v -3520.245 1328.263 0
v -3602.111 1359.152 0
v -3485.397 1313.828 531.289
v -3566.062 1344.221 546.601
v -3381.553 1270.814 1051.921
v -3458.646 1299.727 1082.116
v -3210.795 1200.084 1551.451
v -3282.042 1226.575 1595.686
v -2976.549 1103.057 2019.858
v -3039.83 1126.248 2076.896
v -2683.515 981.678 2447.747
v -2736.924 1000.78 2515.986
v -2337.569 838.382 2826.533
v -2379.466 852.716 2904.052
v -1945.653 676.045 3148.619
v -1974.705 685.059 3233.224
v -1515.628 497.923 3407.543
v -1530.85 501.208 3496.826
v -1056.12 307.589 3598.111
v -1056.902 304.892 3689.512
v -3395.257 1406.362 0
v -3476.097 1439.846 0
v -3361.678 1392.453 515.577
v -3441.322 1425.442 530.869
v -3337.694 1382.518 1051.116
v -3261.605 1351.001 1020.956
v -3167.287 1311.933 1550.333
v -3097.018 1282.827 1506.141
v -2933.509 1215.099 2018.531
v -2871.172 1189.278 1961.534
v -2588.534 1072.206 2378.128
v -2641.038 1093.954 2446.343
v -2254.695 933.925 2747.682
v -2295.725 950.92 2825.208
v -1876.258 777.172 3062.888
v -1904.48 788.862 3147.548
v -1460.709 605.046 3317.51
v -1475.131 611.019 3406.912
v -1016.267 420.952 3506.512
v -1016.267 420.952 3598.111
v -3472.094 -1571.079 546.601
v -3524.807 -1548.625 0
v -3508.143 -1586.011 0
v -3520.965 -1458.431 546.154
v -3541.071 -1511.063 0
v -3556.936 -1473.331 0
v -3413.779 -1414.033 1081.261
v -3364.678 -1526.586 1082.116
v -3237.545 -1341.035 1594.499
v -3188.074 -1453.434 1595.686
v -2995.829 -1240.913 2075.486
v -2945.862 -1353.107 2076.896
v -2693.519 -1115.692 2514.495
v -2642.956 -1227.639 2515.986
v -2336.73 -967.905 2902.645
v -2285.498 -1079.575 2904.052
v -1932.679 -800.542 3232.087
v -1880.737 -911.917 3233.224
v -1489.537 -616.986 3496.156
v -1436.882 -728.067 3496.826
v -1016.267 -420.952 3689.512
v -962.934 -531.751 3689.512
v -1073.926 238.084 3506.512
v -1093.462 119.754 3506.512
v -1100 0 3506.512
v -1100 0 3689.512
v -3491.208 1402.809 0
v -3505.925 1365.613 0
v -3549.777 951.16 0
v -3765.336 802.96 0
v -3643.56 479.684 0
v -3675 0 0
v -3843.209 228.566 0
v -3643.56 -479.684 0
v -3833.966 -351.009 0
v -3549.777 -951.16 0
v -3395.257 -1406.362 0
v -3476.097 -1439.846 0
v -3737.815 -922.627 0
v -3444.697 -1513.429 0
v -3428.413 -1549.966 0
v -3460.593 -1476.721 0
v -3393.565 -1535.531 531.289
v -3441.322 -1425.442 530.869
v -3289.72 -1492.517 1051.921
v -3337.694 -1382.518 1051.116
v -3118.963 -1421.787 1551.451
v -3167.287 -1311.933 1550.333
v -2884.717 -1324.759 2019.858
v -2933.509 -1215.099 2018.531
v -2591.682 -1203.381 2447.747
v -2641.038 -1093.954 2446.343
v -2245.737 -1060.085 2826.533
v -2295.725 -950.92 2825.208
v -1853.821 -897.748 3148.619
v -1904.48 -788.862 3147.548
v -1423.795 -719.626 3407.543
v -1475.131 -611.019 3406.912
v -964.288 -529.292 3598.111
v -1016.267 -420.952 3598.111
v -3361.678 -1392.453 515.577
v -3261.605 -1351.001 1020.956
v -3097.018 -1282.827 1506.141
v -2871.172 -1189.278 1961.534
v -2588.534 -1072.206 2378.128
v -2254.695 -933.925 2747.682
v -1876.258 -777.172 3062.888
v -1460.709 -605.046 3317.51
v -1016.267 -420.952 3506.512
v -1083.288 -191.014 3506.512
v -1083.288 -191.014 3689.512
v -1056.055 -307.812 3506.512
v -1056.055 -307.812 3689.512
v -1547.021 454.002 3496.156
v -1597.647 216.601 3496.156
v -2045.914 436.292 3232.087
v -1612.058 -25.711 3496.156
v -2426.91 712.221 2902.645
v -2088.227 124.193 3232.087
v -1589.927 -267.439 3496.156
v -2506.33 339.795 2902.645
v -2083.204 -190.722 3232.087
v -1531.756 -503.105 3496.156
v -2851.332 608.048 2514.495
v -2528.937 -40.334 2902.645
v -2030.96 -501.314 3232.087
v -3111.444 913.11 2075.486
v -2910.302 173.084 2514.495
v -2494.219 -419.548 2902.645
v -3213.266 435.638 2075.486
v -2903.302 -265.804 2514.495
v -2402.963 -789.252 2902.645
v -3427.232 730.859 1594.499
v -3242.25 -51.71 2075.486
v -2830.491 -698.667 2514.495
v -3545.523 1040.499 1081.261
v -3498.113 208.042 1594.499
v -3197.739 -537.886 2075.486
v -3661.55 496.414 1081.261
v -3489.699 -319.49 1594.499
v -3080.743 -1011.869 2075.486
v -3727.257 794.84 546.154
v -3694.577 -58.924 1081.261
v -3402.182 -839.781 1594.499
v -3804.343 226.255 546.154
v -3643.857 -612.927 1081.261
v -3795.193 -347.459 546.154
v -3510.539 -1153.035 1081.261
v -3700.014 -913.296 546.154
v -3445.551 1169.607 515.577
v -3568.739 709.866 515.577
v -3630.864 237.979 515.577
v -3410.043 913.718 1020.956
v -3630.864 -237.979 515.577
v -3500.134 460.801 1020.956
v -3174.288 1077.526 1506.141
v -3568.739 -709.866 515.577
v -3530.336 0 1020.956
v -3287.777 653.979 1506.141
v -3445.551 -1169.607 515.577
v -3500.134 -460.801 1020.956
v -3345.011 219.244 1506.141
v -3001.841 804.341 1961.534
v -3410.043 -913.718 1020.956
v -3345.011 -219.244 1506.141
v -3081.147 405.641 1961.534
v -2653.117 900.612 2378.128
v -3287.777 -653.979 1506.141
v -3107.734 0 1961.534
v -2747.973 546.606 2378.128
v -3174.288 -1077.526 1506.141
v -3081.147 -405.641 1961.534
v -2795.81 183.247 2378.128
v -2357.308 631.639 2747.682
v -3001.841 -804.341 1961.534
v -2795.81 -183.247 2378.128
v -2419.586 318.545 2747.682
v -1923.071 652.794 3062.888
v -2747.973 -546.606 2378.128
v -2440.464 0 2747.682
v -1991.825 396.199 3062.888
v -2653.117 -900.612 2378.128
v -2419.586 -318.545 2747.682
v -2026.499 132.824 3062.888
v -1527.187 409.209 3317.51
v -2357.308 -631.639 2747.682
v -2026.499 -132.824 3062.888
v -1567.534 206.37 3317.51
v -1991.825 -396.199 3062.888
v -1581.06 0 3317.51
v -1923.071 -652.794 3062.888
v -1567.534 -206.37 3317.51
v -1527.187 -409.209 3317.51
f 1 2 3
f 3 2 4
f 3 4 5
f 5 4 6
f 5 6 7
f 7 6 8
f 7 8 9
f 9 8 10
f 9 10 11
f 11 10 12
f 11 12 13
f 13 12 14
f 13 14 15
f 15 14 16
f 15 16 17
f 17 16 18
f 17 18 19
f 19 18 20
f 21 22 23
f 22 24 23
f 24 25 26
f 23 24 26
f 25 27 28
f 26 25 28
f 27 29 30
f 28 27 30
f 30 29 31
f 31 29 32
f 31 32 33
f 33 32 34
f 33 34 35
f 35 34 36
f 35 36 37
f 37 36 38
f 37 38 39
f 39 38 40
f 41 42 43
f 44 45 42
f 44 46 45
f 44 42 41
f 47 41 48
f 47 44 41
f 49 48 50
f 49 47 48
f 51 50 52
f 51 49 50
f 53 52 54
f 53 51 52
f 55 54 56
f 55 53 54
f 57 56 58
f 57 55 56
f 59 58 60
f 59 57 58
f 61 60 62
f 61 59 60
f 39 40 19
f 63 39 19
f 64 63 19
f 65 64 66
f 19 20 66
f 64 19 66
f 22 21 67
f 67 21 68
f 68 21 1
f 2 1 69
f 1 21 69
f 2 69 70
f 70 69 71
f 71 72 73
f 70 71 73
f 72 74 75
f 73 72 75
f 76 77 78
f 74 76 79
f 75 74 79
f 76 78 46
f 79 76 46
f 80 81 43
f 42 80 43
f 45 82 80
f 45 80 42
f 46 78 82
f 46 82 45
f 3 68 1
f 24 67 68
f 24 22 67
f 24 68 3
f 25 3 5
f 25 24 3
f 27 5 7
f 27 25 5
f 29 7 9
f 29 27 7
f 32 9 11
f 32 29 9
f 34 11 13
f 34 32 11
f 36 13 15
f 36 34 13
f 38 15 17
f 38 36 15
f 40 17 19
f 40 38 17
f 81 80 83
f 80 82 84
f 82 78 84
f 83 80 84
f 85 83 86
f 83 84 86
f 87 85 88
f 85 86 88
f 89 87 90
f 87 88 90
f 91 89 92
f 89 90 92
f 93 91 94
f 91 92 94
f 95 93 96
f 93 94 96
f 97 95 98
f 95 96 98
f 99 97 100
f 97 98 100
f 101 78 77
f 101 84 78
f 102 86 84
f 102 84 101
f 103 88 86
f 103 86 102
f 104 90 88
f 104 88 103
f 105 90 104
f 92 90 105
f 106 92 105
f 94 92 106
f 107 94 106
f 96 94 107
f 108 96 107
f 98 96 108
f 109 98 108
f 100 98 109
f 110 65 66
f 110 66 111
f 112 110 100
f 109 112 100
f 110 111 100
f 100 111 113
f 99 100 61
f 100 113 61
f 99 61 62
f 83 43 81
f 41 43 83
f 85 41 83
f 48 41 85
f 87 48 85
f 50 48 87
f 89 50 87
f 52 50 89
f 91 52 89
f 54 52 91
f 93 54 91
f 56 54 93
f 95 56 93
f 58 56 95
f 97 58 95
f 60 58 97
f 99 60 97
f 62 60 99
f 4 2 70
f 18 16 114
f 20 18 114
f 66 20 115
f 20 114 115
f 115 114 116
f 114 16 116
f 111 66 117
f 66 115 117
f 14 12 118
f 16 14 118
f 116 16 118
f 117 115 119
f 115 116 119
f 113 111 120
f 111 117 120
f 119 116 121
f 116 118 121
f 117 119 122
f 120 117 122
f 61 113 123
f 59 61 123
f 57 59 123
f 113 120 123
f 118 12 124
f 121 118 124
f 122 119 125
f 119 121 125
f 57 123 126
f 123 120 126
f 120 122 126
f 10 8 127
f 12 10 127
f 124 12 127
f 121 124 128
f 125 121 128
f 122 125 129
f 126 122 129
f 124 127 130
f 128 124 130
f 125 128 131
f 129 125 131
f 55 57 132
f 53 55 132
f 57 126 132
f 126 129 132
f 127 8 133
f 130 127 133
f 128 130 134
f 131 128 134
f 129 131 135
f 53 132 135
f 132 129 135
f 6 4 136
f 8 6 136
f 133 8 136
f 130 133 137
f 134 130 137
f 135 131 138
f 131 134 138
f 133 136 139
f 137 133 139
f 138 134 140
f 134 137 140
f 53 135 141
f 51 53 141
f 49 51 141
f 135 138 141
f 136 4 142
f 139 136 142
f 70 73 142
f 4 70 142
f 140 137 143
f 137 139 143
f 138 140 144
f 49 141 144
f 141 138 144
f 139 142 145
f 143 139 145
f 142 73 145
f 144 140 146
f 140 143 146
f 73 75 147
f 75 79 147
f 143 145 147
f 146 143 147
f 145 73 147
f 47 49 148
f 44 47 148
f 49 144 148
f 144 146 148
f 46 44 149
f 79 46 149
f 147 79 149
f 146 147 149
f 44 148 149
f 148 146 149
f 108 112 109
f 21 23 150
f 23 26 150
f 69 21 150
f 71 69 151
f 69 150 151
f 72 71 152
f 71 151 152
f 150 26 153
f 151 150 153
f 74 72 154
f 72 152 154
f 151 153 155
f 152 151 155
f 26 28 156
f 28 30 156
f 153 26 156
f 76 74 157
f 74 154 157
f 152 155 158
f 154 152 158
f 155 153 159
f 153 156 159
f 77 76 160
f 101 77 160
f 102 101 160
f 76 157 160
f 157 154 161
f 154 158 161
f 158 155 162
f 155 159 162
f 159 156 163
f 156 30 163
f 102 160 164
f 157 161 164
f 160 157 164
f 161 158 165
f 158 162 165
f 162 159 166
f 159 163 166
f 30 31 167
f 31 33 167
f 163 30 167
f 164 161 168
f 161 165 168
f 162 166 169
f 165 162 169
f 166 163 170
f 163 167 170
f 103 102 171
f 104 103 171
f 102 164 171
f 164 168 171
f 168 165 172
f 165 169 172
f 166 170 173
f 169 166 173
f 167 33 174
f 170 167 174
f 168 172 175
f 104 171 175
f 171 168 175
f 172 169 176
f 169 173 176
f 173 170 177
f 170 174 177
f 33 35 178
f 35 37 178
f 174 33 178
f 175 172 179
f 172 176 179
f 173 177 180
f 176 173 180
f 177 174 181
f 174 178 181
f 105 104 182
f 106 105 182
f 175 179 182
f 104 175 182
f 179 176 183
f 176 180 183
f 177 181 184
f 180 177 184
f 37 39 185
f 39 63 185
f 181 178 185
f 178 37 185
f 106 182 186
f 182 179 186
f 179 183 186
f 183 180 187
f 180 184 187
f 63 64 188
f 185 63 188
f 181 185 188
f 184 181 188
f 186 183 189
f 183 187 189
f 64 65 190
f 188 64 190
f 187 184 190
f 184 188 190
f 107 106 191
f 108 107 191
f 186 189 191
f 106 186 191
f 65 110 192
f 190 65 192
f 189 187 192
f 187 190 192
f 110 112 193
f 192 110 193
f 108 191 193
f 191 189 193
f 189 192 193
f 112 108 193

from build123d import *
from build123d import SkipClean  # not in build123d's __all__

# Parameters (mm, degrees)
F3_ANGLE_BACK = 22.5
F3_ANGLE      = 45
F8_W          = 1100
F8_H          = 4000


with BuildPart() as f3:
    # F2 (on Front) → F3 (revolve)
    with BuildSketch(Plane.XZ, mode=Mode.PRIVATE) as f3_sk:
        with BuildLine():
            Line((-1000, 3536.3293115885), (-1000, 3717.8622890043))
            ThreePointArc((-1000, 3717.8622890043), (-3055.5277776515, 2342.2745355743), (-3850, 0))
            Line((-3850, 0), (-3675, 0))
            ThreePointArc((-3675, 0), (-2930.9234892777, 2217.050405381), (-1000, 3536.3293115885))
        make_face()
    revolve(f3_sk.sketch.rotate(Axis((0, 0, 3762.5), (0, 0, 1)), -F3_ANGLE_BACK), axis=Axis((0, 0, 3762.5), (0, 0, 1)), revolution_arc=F3_ANGLE)

    # F5: sweep along a path in F5_path
    with BuildLine(Plane(origin=(-3556.9362001685, 1473.3312146056, 0), x_dir=(-0.9238795325, 0.3826834324, 0), z_dir=(-0.3826834324, -0.9238795325, 0))) as f5_path:
        ThreePointArc((0, 0), (-794.4722223485, -2342.2745355743), (-2850, -3717.8622890043))
    # F4 (on face) → F5 (sweep, cut)
    with BuildSketch(Plane(origin=(0, 0, 0), x_dir=(1, 0, 0), z_dir=(0, 0, -1))):
        with BuildLine():
            ThreePointArc((-3476.0967410737, -1439.8464142737), (-3498.6157300331, -1384.230552894), (-3520.2449580431, -1328.2626567709))
            Line((-3520.2449580431, -1328.2626567709), (-3602.111119858, -1359.1524859982))
            ThreePointArc((-3602.111119858, -1359.1524859982), (-3579.9788865455, -1416.4219611008), (-3556.9362001685, -1473.3312146056))
            Line((-3556.9362001685, -1473.3312146056), (-3476.0967410737, -1439.8464142737))
        make_face()
    sweep(path=f5_path.line, mode=Mode.SUBTRACT)

    # F7: sweep along a path in F7_path
    with BuildLine(Plane(origin=(-3556.9362001685, -1473.3312146056, 0), x_dir=(-0.9238795325, -0.3826834324, 0), z_dir=(0.3826834324, -0.9238795325, 0))) as f7_path:
        ThreePointArc((0, 0), (-794.4722223485, -2342.2745355743), (-2850, -3717.8622890043))
    # F6 (on face) → F7 (sweep)
    with BuildSketch(Plane(origin=(0, 0, 0), x_dir=(1, 0, 0), z_dir=(0, 0, -1))):
        with BuildLine():
            Line((-3428.4126130696, 1549.9655494704), (-3508.143138955, 1586.0112599232))
            ThreePointArc((-3508.143138955, 1586.0112599232), (-3532.9889208969, 1529.865773465), (-3556.9362001685, 1473.3312146056))
            Line((-3556.9362001685, 1473.3312146056), (-3476.0967410737, 1439.8464142737))
            ThreePointArc((-3476.0967410737, 1439.8464142736), (-3452.6937181493, 1495.0960967954), (-3428.4126130696, 1549.9655494704))
        make_face()
    with SkipClean():  # cleaning this boolean's faces spoils the solid; the shape is the same uncleaned
        sweep(path=f7_path.line)

    # F8 (on Front) → F9 (revolve, cut)
    with BuildSketch(Plane.XZ):
        with Locations((-550, 2000)):
            Rectangle(F8_W, F8_H)
    with SkipClean():  # cleaning this boolean's faces spoils the solid; the shape is the same uncleaned
        revolve(axis=Axis((0, 0, 2000), (0, 0, 1)), mode=Mode.SUBTRACT)


solid = f3.part
